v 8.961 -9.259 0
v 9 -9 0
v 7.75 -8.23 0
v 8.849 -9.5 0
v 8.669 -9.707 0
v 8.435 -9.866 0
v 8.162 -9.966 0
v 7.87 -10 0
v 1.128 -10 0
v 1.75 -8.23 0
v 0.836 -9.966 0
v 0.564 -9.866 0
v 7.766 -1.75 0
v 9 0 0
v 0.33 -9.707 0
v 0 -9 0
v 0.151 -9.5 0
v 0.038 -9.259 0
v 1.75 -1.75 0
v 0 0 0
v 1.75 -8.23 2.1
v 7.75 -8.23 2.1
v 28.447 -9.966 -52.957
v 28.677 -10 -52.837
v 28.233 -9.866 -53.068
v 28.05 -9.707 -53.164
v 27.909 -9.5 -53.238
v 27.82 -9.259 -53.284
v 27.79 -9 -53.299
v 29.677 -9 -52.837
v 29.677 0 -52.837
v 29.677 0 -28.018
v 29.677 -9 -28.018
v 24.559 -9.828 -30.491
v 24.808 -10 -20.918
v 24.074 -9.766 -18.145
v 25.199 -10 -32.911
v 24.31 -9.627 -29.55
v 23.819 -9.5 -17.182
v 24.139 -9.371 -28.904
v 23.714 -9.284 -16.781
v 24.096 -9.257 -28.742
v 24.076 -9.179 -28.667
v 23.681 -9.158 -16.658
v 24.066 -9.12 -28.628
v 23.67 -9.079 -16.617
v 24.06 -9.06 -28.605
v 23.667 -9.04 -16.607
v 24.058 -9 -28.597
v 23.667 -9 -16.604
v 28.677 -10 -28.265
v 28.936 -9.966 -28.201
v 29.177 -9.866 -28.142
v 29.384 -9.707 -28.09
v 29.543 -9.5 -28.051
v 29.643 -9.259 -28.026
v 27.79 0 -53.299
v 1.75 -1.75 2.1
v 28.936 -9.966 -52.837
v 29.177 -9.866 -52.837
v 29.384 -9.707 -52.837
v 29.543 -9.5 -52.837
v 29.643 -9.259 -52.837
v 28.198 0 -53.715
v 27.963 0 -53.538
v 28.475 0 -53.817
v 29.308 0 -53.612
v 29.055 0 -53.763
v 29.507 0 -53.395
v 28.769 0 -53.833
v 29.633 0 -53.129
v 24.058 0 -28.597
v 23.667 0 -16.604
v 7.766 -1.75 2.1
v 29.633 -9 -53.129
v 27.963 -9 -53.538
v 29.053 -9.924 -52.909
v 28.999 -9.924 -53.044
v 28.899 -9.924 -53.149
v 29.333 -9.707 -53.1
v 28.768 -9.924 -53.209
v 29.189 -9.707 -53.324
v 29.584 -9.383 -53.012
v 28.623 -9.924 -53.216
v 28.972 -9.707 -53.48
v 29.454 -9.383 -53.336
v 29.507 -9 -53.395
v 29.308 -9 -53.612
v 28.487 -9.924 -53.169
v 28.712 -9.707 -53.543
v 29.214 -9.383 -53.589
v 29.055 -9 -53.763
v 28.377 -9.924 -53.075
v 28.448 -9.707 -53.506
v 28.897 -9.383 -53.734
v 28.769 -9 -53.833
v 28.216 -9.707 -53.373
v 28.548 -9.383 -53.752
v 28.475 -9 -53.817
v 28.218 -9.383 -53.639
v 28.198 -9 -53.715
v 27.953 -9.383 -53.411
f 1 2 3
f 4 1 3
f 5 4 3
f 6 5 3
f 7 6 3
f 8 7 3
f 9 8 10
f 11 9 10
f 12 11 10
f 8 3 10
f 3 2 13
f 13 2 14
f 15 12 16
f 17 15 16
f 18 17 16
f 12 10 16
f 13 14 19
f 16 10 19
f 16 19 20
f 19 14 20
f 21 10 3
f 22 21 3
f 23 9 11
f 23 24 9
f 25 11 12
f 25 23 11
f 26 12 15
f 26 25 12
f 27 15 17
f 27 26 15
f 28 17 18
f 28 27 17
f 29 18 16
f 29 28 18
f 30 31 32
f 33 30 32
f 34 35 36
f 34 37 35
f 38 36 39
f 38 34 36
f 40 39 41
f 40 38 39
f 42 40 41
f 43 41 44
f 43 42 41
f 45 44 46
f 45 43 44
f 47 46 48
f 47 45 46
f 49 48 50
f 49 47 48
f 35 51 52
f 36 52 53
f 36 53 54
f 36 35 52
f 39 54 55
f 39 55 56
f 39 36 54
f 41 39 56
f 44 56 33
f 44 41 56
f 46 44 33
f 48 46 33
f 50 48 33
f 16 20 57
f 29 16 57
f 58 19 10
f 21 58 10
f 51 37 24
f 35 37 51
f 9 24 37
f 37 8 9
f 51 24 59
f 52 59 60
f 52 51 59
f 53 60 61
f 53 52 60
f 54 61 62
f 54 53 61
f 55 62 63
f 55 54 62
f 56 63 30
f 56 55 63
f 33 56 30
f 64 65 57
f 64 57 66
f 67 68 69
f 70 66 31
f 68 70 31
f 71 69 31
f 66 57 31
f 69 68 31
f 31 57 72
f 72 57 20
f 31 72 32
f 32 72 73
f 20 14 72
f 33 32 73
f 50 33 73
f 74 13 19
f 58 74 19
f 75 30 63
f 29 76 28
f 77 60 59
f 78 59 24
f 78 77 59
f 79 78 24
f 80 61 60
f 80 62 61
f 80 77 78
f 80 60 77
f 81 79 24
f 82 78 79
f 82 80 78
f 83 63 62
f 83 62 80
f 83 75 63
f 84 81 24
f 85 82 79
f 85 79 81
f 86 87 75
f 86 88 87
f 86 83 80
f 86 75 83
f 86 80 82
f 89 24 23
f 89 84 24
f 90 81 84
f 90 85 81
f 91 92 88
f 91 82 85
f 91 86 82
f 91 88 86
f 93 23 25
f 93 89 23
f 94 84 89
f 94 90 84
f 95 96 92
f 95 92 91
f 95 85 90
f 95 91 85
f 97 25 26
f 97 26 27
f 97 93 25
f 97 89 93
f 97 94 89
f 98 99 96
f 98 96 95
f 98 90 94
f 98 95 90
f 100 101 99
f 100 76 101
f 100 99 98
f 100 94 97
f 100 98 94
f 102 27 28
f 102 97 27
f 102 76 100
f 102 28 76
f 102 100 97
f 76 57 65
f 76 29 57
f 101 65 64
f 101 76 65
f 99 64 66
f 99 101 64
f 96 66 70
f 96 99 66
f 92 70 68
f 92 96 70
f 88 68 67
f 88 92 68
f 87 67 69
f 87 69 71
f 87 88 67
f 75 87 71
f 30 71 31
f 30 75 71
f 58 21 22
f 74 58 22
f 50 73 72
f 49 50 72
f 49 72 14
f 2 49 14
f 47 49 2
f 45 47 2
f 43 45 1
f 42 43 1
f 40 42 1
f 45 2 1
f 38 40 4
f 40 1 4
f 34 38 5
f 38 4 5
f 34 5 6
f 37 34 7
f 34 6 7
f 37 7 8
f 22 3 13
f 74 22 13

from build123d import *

# Parameters (mm, degrees)
F1_DEPTH = 10
F3_DEPTH = 2.1
F5_R     = 1


# Not quite as in the source:
# - a feature of the source that left no trace in its solid (it failed there, or was rolled back) is left out


with BuildPart() as f1:
    # F0 (on Front) → F1 (new body)
    with BuildSketch(Plane.XZ):
        Polygon((9, 0), (0, 0), (29.6767346319, -56.9180645261), (29.6767346319, -28.0180645261), (23.6665218482, -16.6037164372), (24.0578948756, -28.5973325372), align=None)
    extrude(amount=F1_DEPTH)

    # F2 (on face) → F3 (join)
    with BuildSketch(Plane.XY):
        Polygon((7.7660586685, -1.75), (1.75, -1.75), (1.75, -8.23), (7.75, -8.23), align=None)
    extrude(amount=F3_DEPTH)

    # F5
    f5_edges = [f1.edges().sort_by_distance(p)[0] for p in [
        (16.528947, -10, -14.298666),
        (23.862208, -10, -22.600524),
        (26.671628, -10, -22.31089),
        (29.676735, -10, -42.468065),
        (14.838367, -10, -28.459032),
        (29.676735, -5, -56.918065),
    ]]
    fillet(f5_edges, radius=F5_R)


solid = f1.part
